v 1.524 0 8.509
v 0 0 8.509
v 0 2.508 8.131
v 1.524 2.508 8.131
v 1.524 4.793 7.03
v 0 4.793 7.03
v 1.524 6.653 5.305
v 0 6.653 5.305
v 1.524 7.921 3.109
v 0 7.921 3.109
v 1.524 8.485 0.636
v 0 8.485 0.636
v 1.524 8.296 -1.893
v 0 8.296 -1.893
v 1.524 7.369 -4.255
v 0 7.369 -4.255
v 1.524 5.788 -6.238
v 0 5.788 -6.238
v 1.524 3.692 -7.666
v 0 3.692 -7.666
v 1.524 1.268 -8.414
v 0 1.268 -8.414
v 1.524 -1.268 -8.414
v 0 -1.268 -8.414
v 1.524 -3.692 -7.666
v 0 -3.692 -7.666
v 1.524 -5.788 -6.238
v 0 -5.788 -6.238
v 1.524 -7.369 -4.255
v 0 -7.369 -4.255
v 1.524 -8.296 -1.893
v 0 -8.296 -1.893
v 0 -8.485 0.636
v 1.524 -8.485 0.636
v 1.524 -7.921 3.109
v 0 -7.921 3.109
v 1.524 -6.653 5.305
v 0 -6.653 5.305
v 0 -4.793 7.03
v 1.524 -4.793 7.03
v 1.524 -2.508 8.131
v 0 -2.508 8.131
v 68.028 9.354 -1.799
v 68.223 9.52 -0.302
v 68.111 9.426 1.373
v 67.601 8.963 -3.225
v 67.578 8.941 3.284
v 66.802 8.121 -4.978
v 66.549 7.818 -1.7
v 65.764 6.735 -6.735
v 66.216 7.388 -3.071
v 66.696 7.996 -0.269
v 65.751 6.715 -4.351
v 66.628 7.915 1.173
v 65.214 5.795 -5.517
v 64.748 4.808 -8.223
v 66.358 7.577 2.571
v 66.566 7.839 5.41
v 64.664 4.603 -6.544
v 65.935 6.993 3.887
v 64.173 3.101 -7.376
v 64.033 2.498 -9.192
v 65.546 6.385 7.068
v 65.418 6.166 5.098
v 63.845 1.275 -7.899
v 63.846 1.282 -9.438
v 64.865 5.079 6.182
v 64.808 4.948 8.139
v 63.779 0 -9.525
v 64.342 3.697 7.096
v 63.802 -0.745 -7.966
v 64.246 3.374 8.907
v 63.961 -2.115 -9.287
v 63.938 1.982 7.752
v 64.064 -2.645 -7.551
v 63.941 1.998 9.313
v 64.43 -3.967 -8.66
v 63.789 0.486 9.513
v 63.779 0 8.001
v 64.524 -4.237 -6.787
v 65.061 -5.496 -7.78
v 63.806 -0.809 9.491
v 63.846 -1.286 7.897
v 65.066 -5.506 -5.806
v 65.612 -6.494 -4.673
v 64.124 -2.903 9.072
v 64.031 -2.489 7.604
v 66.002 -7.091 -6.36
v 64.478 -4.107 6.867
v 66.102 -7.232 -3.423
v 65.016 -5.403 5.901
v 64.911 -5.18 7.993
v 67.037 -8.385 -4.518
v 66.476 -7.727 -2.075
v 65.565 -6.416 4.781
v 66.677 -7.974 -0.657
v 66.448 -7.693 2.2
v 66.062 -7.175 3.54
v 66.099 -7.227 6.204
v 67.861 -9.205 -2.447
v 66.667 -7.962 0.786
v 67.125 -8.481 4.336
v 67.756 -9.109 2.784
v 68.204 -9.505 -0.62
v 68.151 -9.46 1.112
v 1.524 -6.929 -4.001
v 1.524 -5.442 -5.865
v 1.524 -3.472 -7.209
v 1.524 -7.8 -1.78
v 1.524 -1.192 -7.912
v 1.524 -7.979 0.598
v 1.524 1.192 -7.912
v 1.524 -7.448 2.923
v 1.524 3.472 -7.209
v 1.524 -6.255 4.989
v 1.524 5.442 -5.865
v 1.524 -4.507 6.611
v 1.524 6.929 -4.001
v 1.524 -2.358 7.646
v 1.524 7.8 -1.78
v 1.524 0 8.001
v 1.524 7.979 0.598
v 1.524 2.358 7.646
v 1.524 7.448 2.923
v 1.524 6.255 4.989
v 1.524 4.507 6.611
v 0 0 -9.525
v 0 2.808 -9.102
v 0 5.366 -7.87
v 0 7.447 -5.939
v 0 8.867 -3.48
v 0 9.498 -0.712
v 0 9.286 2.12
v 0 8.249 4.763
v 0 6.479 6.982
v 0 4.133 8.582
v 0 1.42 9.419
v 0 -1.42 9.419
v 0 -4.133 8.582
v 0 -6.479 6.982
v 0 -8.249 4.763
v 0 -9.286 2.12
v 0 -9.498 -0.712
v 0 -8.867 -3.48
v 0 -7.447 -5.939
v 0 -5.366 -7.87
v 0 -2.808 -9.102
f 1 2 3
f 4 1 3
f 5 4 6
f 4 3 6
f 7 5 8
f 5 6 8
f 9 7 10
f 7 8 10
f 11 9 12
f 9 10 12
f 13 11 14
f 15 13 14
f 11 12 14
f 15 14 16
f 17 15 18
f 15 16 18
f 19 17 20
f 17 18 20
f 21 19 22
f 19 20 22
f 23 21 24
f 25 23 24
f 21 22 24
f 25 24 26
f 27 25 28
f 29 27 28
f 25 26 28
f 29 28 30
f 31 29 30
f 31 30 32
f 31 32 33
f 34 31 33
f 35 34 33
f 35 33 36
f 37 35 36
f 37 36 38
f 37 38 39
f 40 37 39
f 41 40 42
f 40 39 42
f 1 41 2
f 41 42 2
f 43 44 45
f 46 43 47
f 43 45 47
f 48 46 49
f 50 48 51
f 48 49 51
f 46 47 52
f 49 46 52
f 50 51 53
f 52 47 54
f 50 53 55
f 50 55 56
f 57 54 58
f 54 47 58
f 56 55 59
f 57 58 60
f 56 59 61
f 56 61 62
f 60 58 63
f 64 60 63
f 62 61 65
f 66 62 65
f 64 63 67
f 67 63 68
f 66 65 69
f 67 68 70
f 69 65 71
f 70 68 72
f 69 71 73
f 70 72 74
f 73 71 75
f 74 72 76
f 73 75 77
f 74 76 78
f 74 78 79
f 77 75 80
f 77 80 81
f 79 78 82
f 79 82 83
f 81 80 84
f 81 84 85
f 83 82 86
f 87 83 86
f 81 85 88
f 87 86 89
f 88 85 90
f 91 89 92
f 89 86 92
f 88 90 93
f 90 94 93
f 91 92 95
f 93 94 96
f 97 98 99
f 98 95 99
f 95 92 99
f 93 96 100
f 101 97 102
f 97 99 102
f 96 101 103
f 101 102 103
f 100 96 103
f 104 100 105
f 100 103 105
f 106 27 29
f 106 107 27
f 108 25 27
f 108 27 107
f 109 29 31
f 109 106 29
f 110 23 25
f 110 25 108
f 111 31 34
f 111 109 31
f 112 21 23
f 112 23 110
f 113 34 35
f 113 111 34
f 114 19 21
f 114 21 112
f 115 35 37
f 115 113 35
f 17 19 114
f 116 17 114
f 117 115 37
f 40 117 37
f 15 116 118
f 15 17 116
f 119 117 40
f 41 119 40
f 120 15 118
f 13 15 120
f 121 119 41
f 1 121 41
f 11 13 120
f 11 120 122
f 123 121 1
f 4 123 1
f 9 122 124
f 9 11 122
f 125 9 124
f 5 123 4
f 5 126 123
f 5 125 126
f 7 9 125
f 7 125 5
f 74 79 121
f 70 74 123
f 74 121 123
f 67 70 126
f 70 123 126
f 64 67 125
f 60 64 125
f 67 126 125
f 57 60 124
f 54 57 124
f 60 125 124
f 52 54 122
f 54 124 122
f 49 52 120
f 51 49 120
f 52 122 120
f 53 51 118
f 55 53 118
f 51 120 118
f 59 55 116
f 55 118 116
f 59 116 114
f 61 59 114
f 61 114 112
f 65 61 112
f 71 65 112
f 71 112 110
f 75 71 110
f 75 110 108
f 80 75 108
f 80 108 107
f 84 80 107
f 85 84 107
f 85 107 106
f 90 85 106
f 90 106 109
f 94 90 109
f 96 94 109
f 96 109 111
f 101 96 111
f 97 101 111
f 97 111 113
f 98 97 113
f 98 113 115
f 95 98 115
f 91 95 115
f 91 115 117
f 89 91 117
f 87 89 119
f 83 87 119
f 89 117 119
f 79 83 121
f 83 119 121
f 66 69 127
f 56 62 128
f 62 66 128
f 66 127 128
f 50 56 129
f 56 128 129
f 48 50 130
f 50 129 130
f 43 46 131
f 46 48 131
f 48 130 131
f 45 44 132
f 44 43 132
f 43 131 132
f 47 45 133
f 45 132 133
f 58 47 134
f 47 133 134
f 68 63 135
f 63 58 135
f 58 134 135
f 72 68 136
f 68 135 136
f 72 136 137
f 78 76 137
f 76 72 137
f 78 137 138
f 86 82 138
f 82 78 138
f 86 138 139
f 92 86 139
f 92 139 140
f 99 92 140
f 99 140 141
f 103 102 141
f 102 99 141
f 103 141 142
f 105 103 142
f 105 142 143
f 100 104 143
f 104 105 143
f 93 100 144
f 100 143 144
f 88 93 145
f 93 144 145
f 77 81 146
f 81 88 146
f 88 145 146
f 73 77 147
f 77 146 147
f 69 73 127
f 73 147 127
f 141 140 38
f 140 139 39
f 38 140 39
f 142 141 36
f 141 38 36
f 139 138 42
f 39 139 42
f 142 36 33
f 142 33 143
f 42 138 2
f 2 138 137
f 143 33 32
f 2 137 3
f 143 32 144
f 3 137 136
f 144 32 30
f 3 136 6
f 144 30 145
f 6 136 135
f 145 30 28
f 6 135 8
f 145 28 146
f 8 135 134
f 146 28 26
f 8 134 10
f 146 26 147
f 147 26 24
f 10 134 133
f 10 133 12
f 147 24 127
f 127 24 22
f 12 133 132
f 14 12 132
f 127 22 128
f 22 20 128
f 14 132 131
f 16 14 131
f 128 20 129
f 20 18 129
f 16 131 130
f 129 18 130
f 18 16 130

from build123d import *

# Parameters (mm, degrees)
SKETCH1_R           = 9.525
BOSS_EXTRUDE1_DEPTH = 76.2
SKETCH3_R           = 8.509
CUT_EXTRUDE1_DEPTH  = 1.524
SKETCH4_R           = 8.001
CUT_EXTRUDE2_DEPTH  = 75.676
SKETCH5_R           = 12.4206
CUT_EXTRUDE3_DEPTH  = 254


with BuildPart() as part:
    # Sketch1 → Boss-Extrude1 (new body)
    with BuildSketch(Plane(origin=(0, 0, 0), x_dir=(0, 0, -1), z_dir=(1, 0, 0))):
        Circle(SKETCH1_R)
    extrude(amount=BOSS_EXTRUDE1_DEPTH)

    # Sketch3 → Cut-Extrude1 (cut)
    with BuildSketch(Plane.ZY):
        Circle(SKETCH3_R)
    extrude(amount=-CUT_EXTRUDE1_DEPTH, mode=Mode.SUBTRACT)

    # Sketch4 → Cut-Extrude2 (cut, through all)
    with BuildSketch(Plane.ZY.offset(-1.524)):
        Circle(SKETCH4_R)
    extrude(amount=-CUT_EXTRUDE2_DEPTH, mode=Mode.SUBTRACT)

    # Sketch5 → Cut-Extrude3 (cut)
    with BuildSketch(Plane.XY.offset(9.525)):
        with Locations((76.2, 0)):
            Circle(SKETCH5_R)
    extrude(amount=-CUT_EXTRUDE3_DEPTH, mode=Mode.SUBTRACT)


solid = part.part
